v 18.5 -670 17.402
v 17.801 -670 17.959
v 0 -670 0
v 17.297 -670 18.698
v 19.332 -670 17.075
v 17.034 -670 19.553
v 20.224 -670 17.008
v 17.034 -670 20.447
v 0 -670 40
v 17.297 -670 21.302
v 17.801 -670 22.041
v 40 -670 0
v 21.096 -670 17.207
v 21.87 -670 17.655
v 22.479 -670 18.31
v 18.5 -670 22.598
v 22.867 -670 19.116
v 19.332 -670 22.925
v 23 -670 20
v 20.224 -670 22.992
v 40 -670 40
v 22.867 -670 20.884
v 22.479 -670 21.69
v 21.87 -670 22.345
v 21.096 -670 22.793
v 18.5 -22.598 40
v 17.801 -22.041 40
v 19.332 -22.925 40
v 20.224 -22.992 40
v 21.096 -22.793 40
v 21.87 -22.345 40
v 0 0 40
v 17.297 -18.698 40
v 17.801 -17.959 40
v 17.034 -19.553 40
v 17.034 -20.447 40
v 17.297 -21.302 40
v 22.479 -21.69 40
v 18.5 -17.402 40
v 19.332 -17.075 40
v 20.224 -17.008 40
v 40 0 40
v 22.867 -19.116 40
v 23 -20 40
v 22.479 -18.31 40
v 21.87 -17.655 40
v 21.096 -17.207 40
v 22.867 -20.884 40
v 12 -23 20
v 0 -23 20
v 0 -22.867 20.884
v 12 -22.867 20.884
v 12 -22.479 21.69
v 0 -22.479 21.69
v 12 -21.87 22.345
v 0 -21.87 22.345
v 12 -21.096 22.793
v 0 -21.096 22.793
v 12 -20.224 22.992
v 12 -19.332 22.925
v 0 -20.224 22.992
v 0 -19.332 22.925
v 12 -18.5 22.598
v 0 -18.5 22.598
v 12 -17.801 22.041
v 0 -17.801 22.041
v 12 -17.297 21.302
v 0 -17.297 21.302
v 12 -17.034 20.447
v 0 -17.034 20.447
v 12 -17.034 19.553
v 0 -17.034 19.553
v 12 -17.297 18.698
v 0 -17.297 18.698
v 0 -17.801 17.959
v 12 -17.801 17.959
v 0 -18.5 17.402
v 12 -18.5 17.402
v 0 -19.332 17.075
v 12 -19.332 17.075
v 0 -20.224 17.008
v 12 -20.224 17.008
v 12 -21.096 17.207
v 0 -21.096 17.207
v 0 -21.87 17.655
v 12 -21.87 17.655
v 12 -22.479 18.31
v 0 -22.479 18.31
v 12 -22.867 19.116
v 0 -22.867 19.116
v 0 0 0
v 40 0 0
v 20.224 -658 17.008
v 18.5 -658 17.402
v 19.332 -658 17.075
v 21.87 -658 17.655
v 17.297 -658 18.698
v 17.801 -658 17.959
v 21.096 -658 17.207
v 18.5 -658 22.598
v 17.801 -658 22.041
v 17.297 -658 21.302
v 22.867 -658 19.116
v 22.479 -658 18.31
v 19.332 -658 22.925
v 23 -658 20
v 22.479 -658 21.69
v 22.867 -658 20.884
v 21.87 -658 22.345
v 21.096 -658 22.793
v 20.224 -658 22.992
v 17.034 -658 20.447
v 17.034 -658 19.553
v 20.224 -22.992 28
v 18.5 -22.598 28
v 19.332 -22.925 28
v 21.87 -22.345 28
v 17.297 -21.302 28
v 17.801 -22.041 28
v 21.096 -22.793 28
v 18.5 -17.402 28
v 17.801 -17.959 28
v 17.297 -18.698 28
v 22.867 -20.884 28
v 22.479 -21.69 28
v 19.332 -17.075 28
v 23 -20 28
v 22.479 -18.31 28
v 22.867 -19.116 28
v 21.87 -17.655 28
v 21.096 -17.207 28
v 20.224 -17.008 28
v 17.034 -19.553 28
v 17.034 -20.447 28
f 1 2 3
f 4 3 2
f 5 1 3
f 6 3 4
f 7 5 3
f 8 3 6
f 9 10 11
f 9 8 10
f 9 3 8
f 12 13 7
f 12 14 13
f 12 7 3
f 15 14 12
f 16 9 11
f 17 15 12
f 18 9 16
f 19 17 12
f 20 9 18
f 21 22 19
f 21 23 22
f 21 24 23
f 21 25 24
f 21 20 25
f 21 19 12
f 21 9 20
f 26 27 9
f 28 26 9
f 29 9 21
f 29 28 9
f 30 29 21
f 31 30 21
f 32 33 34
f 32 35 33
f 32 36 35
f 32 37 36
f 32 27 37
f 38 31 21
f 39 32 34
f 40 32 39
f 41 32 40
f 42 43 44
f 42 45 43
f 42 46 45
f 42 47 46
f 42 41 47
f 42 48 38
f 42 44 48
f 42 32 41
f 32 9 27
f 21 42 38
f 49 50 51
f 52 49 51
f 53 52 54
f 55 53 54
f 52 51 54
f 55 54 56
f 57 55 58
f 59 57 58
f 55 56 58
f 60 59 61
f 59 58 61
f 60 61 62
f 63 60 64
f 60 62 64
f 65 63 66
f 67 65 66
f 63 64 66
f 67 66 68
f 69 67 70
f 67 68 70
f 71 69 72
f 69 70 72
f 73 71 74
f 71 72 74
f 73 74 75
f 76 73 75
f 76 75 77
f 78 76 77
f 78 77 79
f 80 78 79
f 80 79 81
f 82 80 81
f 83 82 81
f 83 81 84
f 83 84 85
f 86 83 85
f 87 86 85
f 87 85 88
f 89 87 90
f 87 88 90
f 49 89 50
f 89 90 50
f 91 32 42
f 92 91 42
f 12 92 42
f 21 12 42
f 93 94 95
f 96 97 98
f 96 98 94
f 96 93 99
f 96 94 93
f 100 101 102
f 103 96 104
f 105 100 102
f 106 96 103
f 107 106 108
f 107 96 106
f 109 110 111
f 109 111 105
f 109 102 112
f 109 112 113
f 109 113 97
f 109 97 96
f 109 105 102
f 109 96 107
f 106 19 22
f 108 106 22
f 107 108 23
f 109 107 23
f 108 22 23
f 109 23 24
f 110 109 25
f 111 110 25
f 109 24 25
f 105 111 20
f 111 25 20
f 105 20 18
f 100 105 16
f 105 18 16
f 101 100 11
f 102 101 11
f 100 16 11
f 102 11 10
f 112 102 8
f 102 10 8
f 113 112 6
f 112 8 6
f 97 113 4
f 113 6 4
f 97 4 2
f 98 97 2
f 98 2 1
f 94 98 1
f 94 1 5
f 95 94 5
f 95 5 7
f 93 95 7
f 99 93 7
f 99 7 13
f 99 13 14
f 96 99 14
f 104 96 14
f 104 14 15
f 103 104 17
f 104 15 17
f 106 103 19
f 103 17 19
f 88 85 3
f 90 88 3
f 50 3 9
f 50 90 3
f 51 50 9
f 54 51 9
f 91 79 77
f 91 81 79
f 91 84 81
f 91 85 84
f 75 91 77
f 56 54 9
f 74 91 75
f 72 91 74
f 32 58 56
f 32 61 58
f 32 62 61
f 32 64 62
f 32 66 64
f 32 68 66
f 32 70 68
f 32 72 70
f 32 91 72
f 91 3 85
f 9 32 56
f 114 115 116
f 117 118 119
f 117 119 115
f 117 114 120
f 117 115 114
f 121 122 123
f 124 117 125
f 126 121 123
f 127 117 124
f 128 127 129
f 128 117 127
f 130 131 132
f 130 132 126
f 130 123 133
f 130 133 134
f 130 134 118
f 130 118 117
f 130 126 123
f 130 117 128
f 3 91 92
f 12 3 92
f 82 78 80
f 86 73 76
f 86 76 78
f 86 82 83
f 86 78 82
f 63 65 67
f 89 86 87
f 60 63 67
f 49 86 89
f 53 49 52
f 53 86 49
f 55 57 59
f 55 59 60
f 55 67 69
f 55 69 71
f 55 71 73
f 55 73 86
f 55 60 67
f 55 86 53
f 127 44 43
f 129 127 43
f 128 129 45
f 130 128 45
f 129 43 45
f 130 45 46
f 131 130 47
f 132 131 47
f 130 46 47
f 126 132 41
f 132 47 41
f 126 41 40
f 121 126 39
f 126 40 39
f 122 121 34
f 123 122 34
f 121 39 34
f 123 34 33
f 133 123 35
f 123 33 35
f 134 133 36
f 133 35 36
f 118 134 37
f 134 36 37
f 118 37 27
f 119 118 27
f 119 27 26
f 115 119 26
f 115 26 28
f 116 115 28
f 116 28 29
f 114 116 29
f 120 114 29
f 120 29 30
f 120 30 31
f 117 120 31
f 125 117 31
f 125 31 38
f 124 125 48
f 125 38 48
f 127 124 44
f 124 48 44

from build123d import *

# Parameters (mm, degrees)
F0_W     = 40
F0_H     = 40
F1_DEPTH = 670
F2_R     = 3
F3_DEPTH = 12
F4_R     = 3
F5_DEPTH = 12
F6_R     = 3
F7_DEPTH = 12


with BuildPart() as f1:
    # F0 (on Front) → F1 (new body)
    with BuildSketch(Plane.XZ):
        with Locations((20, 20)):
            Rectangle(F0_W, F0_H)
    extrude(amount=F1_DEPTH)

    # F2 (on face) → F3 (cut)
    with BuildSketch(Plane.XZ.offset(670)):
        with Locations((20, 20)):
            Circle(F2_R)
    extrude(amount=-F3_DEPTH, mode=Mode.SUBTRACT)

    # F4 (on face) → F5 (cut)
    with BuildSketch(Plane(origin=(0, 0, 0), x_dir=(0, -1, 0), z_dir=(-1, 0, 0))):
        with Locations((20, 20)):
            Circle(F4_R)
    extrude(amount=-F5_DEPTH, mode=Mode.SUBTRACT)

    # F6 (on face) → F7 (cut)
    with BuildSketch(Plane.XY.offset(40)):
        with Locations((20, -20)):
            Circle(F6_R)
    extrude(amount=-F7_DEPTH, mode=Mode.SUBTRACT)


solid = f1.part
